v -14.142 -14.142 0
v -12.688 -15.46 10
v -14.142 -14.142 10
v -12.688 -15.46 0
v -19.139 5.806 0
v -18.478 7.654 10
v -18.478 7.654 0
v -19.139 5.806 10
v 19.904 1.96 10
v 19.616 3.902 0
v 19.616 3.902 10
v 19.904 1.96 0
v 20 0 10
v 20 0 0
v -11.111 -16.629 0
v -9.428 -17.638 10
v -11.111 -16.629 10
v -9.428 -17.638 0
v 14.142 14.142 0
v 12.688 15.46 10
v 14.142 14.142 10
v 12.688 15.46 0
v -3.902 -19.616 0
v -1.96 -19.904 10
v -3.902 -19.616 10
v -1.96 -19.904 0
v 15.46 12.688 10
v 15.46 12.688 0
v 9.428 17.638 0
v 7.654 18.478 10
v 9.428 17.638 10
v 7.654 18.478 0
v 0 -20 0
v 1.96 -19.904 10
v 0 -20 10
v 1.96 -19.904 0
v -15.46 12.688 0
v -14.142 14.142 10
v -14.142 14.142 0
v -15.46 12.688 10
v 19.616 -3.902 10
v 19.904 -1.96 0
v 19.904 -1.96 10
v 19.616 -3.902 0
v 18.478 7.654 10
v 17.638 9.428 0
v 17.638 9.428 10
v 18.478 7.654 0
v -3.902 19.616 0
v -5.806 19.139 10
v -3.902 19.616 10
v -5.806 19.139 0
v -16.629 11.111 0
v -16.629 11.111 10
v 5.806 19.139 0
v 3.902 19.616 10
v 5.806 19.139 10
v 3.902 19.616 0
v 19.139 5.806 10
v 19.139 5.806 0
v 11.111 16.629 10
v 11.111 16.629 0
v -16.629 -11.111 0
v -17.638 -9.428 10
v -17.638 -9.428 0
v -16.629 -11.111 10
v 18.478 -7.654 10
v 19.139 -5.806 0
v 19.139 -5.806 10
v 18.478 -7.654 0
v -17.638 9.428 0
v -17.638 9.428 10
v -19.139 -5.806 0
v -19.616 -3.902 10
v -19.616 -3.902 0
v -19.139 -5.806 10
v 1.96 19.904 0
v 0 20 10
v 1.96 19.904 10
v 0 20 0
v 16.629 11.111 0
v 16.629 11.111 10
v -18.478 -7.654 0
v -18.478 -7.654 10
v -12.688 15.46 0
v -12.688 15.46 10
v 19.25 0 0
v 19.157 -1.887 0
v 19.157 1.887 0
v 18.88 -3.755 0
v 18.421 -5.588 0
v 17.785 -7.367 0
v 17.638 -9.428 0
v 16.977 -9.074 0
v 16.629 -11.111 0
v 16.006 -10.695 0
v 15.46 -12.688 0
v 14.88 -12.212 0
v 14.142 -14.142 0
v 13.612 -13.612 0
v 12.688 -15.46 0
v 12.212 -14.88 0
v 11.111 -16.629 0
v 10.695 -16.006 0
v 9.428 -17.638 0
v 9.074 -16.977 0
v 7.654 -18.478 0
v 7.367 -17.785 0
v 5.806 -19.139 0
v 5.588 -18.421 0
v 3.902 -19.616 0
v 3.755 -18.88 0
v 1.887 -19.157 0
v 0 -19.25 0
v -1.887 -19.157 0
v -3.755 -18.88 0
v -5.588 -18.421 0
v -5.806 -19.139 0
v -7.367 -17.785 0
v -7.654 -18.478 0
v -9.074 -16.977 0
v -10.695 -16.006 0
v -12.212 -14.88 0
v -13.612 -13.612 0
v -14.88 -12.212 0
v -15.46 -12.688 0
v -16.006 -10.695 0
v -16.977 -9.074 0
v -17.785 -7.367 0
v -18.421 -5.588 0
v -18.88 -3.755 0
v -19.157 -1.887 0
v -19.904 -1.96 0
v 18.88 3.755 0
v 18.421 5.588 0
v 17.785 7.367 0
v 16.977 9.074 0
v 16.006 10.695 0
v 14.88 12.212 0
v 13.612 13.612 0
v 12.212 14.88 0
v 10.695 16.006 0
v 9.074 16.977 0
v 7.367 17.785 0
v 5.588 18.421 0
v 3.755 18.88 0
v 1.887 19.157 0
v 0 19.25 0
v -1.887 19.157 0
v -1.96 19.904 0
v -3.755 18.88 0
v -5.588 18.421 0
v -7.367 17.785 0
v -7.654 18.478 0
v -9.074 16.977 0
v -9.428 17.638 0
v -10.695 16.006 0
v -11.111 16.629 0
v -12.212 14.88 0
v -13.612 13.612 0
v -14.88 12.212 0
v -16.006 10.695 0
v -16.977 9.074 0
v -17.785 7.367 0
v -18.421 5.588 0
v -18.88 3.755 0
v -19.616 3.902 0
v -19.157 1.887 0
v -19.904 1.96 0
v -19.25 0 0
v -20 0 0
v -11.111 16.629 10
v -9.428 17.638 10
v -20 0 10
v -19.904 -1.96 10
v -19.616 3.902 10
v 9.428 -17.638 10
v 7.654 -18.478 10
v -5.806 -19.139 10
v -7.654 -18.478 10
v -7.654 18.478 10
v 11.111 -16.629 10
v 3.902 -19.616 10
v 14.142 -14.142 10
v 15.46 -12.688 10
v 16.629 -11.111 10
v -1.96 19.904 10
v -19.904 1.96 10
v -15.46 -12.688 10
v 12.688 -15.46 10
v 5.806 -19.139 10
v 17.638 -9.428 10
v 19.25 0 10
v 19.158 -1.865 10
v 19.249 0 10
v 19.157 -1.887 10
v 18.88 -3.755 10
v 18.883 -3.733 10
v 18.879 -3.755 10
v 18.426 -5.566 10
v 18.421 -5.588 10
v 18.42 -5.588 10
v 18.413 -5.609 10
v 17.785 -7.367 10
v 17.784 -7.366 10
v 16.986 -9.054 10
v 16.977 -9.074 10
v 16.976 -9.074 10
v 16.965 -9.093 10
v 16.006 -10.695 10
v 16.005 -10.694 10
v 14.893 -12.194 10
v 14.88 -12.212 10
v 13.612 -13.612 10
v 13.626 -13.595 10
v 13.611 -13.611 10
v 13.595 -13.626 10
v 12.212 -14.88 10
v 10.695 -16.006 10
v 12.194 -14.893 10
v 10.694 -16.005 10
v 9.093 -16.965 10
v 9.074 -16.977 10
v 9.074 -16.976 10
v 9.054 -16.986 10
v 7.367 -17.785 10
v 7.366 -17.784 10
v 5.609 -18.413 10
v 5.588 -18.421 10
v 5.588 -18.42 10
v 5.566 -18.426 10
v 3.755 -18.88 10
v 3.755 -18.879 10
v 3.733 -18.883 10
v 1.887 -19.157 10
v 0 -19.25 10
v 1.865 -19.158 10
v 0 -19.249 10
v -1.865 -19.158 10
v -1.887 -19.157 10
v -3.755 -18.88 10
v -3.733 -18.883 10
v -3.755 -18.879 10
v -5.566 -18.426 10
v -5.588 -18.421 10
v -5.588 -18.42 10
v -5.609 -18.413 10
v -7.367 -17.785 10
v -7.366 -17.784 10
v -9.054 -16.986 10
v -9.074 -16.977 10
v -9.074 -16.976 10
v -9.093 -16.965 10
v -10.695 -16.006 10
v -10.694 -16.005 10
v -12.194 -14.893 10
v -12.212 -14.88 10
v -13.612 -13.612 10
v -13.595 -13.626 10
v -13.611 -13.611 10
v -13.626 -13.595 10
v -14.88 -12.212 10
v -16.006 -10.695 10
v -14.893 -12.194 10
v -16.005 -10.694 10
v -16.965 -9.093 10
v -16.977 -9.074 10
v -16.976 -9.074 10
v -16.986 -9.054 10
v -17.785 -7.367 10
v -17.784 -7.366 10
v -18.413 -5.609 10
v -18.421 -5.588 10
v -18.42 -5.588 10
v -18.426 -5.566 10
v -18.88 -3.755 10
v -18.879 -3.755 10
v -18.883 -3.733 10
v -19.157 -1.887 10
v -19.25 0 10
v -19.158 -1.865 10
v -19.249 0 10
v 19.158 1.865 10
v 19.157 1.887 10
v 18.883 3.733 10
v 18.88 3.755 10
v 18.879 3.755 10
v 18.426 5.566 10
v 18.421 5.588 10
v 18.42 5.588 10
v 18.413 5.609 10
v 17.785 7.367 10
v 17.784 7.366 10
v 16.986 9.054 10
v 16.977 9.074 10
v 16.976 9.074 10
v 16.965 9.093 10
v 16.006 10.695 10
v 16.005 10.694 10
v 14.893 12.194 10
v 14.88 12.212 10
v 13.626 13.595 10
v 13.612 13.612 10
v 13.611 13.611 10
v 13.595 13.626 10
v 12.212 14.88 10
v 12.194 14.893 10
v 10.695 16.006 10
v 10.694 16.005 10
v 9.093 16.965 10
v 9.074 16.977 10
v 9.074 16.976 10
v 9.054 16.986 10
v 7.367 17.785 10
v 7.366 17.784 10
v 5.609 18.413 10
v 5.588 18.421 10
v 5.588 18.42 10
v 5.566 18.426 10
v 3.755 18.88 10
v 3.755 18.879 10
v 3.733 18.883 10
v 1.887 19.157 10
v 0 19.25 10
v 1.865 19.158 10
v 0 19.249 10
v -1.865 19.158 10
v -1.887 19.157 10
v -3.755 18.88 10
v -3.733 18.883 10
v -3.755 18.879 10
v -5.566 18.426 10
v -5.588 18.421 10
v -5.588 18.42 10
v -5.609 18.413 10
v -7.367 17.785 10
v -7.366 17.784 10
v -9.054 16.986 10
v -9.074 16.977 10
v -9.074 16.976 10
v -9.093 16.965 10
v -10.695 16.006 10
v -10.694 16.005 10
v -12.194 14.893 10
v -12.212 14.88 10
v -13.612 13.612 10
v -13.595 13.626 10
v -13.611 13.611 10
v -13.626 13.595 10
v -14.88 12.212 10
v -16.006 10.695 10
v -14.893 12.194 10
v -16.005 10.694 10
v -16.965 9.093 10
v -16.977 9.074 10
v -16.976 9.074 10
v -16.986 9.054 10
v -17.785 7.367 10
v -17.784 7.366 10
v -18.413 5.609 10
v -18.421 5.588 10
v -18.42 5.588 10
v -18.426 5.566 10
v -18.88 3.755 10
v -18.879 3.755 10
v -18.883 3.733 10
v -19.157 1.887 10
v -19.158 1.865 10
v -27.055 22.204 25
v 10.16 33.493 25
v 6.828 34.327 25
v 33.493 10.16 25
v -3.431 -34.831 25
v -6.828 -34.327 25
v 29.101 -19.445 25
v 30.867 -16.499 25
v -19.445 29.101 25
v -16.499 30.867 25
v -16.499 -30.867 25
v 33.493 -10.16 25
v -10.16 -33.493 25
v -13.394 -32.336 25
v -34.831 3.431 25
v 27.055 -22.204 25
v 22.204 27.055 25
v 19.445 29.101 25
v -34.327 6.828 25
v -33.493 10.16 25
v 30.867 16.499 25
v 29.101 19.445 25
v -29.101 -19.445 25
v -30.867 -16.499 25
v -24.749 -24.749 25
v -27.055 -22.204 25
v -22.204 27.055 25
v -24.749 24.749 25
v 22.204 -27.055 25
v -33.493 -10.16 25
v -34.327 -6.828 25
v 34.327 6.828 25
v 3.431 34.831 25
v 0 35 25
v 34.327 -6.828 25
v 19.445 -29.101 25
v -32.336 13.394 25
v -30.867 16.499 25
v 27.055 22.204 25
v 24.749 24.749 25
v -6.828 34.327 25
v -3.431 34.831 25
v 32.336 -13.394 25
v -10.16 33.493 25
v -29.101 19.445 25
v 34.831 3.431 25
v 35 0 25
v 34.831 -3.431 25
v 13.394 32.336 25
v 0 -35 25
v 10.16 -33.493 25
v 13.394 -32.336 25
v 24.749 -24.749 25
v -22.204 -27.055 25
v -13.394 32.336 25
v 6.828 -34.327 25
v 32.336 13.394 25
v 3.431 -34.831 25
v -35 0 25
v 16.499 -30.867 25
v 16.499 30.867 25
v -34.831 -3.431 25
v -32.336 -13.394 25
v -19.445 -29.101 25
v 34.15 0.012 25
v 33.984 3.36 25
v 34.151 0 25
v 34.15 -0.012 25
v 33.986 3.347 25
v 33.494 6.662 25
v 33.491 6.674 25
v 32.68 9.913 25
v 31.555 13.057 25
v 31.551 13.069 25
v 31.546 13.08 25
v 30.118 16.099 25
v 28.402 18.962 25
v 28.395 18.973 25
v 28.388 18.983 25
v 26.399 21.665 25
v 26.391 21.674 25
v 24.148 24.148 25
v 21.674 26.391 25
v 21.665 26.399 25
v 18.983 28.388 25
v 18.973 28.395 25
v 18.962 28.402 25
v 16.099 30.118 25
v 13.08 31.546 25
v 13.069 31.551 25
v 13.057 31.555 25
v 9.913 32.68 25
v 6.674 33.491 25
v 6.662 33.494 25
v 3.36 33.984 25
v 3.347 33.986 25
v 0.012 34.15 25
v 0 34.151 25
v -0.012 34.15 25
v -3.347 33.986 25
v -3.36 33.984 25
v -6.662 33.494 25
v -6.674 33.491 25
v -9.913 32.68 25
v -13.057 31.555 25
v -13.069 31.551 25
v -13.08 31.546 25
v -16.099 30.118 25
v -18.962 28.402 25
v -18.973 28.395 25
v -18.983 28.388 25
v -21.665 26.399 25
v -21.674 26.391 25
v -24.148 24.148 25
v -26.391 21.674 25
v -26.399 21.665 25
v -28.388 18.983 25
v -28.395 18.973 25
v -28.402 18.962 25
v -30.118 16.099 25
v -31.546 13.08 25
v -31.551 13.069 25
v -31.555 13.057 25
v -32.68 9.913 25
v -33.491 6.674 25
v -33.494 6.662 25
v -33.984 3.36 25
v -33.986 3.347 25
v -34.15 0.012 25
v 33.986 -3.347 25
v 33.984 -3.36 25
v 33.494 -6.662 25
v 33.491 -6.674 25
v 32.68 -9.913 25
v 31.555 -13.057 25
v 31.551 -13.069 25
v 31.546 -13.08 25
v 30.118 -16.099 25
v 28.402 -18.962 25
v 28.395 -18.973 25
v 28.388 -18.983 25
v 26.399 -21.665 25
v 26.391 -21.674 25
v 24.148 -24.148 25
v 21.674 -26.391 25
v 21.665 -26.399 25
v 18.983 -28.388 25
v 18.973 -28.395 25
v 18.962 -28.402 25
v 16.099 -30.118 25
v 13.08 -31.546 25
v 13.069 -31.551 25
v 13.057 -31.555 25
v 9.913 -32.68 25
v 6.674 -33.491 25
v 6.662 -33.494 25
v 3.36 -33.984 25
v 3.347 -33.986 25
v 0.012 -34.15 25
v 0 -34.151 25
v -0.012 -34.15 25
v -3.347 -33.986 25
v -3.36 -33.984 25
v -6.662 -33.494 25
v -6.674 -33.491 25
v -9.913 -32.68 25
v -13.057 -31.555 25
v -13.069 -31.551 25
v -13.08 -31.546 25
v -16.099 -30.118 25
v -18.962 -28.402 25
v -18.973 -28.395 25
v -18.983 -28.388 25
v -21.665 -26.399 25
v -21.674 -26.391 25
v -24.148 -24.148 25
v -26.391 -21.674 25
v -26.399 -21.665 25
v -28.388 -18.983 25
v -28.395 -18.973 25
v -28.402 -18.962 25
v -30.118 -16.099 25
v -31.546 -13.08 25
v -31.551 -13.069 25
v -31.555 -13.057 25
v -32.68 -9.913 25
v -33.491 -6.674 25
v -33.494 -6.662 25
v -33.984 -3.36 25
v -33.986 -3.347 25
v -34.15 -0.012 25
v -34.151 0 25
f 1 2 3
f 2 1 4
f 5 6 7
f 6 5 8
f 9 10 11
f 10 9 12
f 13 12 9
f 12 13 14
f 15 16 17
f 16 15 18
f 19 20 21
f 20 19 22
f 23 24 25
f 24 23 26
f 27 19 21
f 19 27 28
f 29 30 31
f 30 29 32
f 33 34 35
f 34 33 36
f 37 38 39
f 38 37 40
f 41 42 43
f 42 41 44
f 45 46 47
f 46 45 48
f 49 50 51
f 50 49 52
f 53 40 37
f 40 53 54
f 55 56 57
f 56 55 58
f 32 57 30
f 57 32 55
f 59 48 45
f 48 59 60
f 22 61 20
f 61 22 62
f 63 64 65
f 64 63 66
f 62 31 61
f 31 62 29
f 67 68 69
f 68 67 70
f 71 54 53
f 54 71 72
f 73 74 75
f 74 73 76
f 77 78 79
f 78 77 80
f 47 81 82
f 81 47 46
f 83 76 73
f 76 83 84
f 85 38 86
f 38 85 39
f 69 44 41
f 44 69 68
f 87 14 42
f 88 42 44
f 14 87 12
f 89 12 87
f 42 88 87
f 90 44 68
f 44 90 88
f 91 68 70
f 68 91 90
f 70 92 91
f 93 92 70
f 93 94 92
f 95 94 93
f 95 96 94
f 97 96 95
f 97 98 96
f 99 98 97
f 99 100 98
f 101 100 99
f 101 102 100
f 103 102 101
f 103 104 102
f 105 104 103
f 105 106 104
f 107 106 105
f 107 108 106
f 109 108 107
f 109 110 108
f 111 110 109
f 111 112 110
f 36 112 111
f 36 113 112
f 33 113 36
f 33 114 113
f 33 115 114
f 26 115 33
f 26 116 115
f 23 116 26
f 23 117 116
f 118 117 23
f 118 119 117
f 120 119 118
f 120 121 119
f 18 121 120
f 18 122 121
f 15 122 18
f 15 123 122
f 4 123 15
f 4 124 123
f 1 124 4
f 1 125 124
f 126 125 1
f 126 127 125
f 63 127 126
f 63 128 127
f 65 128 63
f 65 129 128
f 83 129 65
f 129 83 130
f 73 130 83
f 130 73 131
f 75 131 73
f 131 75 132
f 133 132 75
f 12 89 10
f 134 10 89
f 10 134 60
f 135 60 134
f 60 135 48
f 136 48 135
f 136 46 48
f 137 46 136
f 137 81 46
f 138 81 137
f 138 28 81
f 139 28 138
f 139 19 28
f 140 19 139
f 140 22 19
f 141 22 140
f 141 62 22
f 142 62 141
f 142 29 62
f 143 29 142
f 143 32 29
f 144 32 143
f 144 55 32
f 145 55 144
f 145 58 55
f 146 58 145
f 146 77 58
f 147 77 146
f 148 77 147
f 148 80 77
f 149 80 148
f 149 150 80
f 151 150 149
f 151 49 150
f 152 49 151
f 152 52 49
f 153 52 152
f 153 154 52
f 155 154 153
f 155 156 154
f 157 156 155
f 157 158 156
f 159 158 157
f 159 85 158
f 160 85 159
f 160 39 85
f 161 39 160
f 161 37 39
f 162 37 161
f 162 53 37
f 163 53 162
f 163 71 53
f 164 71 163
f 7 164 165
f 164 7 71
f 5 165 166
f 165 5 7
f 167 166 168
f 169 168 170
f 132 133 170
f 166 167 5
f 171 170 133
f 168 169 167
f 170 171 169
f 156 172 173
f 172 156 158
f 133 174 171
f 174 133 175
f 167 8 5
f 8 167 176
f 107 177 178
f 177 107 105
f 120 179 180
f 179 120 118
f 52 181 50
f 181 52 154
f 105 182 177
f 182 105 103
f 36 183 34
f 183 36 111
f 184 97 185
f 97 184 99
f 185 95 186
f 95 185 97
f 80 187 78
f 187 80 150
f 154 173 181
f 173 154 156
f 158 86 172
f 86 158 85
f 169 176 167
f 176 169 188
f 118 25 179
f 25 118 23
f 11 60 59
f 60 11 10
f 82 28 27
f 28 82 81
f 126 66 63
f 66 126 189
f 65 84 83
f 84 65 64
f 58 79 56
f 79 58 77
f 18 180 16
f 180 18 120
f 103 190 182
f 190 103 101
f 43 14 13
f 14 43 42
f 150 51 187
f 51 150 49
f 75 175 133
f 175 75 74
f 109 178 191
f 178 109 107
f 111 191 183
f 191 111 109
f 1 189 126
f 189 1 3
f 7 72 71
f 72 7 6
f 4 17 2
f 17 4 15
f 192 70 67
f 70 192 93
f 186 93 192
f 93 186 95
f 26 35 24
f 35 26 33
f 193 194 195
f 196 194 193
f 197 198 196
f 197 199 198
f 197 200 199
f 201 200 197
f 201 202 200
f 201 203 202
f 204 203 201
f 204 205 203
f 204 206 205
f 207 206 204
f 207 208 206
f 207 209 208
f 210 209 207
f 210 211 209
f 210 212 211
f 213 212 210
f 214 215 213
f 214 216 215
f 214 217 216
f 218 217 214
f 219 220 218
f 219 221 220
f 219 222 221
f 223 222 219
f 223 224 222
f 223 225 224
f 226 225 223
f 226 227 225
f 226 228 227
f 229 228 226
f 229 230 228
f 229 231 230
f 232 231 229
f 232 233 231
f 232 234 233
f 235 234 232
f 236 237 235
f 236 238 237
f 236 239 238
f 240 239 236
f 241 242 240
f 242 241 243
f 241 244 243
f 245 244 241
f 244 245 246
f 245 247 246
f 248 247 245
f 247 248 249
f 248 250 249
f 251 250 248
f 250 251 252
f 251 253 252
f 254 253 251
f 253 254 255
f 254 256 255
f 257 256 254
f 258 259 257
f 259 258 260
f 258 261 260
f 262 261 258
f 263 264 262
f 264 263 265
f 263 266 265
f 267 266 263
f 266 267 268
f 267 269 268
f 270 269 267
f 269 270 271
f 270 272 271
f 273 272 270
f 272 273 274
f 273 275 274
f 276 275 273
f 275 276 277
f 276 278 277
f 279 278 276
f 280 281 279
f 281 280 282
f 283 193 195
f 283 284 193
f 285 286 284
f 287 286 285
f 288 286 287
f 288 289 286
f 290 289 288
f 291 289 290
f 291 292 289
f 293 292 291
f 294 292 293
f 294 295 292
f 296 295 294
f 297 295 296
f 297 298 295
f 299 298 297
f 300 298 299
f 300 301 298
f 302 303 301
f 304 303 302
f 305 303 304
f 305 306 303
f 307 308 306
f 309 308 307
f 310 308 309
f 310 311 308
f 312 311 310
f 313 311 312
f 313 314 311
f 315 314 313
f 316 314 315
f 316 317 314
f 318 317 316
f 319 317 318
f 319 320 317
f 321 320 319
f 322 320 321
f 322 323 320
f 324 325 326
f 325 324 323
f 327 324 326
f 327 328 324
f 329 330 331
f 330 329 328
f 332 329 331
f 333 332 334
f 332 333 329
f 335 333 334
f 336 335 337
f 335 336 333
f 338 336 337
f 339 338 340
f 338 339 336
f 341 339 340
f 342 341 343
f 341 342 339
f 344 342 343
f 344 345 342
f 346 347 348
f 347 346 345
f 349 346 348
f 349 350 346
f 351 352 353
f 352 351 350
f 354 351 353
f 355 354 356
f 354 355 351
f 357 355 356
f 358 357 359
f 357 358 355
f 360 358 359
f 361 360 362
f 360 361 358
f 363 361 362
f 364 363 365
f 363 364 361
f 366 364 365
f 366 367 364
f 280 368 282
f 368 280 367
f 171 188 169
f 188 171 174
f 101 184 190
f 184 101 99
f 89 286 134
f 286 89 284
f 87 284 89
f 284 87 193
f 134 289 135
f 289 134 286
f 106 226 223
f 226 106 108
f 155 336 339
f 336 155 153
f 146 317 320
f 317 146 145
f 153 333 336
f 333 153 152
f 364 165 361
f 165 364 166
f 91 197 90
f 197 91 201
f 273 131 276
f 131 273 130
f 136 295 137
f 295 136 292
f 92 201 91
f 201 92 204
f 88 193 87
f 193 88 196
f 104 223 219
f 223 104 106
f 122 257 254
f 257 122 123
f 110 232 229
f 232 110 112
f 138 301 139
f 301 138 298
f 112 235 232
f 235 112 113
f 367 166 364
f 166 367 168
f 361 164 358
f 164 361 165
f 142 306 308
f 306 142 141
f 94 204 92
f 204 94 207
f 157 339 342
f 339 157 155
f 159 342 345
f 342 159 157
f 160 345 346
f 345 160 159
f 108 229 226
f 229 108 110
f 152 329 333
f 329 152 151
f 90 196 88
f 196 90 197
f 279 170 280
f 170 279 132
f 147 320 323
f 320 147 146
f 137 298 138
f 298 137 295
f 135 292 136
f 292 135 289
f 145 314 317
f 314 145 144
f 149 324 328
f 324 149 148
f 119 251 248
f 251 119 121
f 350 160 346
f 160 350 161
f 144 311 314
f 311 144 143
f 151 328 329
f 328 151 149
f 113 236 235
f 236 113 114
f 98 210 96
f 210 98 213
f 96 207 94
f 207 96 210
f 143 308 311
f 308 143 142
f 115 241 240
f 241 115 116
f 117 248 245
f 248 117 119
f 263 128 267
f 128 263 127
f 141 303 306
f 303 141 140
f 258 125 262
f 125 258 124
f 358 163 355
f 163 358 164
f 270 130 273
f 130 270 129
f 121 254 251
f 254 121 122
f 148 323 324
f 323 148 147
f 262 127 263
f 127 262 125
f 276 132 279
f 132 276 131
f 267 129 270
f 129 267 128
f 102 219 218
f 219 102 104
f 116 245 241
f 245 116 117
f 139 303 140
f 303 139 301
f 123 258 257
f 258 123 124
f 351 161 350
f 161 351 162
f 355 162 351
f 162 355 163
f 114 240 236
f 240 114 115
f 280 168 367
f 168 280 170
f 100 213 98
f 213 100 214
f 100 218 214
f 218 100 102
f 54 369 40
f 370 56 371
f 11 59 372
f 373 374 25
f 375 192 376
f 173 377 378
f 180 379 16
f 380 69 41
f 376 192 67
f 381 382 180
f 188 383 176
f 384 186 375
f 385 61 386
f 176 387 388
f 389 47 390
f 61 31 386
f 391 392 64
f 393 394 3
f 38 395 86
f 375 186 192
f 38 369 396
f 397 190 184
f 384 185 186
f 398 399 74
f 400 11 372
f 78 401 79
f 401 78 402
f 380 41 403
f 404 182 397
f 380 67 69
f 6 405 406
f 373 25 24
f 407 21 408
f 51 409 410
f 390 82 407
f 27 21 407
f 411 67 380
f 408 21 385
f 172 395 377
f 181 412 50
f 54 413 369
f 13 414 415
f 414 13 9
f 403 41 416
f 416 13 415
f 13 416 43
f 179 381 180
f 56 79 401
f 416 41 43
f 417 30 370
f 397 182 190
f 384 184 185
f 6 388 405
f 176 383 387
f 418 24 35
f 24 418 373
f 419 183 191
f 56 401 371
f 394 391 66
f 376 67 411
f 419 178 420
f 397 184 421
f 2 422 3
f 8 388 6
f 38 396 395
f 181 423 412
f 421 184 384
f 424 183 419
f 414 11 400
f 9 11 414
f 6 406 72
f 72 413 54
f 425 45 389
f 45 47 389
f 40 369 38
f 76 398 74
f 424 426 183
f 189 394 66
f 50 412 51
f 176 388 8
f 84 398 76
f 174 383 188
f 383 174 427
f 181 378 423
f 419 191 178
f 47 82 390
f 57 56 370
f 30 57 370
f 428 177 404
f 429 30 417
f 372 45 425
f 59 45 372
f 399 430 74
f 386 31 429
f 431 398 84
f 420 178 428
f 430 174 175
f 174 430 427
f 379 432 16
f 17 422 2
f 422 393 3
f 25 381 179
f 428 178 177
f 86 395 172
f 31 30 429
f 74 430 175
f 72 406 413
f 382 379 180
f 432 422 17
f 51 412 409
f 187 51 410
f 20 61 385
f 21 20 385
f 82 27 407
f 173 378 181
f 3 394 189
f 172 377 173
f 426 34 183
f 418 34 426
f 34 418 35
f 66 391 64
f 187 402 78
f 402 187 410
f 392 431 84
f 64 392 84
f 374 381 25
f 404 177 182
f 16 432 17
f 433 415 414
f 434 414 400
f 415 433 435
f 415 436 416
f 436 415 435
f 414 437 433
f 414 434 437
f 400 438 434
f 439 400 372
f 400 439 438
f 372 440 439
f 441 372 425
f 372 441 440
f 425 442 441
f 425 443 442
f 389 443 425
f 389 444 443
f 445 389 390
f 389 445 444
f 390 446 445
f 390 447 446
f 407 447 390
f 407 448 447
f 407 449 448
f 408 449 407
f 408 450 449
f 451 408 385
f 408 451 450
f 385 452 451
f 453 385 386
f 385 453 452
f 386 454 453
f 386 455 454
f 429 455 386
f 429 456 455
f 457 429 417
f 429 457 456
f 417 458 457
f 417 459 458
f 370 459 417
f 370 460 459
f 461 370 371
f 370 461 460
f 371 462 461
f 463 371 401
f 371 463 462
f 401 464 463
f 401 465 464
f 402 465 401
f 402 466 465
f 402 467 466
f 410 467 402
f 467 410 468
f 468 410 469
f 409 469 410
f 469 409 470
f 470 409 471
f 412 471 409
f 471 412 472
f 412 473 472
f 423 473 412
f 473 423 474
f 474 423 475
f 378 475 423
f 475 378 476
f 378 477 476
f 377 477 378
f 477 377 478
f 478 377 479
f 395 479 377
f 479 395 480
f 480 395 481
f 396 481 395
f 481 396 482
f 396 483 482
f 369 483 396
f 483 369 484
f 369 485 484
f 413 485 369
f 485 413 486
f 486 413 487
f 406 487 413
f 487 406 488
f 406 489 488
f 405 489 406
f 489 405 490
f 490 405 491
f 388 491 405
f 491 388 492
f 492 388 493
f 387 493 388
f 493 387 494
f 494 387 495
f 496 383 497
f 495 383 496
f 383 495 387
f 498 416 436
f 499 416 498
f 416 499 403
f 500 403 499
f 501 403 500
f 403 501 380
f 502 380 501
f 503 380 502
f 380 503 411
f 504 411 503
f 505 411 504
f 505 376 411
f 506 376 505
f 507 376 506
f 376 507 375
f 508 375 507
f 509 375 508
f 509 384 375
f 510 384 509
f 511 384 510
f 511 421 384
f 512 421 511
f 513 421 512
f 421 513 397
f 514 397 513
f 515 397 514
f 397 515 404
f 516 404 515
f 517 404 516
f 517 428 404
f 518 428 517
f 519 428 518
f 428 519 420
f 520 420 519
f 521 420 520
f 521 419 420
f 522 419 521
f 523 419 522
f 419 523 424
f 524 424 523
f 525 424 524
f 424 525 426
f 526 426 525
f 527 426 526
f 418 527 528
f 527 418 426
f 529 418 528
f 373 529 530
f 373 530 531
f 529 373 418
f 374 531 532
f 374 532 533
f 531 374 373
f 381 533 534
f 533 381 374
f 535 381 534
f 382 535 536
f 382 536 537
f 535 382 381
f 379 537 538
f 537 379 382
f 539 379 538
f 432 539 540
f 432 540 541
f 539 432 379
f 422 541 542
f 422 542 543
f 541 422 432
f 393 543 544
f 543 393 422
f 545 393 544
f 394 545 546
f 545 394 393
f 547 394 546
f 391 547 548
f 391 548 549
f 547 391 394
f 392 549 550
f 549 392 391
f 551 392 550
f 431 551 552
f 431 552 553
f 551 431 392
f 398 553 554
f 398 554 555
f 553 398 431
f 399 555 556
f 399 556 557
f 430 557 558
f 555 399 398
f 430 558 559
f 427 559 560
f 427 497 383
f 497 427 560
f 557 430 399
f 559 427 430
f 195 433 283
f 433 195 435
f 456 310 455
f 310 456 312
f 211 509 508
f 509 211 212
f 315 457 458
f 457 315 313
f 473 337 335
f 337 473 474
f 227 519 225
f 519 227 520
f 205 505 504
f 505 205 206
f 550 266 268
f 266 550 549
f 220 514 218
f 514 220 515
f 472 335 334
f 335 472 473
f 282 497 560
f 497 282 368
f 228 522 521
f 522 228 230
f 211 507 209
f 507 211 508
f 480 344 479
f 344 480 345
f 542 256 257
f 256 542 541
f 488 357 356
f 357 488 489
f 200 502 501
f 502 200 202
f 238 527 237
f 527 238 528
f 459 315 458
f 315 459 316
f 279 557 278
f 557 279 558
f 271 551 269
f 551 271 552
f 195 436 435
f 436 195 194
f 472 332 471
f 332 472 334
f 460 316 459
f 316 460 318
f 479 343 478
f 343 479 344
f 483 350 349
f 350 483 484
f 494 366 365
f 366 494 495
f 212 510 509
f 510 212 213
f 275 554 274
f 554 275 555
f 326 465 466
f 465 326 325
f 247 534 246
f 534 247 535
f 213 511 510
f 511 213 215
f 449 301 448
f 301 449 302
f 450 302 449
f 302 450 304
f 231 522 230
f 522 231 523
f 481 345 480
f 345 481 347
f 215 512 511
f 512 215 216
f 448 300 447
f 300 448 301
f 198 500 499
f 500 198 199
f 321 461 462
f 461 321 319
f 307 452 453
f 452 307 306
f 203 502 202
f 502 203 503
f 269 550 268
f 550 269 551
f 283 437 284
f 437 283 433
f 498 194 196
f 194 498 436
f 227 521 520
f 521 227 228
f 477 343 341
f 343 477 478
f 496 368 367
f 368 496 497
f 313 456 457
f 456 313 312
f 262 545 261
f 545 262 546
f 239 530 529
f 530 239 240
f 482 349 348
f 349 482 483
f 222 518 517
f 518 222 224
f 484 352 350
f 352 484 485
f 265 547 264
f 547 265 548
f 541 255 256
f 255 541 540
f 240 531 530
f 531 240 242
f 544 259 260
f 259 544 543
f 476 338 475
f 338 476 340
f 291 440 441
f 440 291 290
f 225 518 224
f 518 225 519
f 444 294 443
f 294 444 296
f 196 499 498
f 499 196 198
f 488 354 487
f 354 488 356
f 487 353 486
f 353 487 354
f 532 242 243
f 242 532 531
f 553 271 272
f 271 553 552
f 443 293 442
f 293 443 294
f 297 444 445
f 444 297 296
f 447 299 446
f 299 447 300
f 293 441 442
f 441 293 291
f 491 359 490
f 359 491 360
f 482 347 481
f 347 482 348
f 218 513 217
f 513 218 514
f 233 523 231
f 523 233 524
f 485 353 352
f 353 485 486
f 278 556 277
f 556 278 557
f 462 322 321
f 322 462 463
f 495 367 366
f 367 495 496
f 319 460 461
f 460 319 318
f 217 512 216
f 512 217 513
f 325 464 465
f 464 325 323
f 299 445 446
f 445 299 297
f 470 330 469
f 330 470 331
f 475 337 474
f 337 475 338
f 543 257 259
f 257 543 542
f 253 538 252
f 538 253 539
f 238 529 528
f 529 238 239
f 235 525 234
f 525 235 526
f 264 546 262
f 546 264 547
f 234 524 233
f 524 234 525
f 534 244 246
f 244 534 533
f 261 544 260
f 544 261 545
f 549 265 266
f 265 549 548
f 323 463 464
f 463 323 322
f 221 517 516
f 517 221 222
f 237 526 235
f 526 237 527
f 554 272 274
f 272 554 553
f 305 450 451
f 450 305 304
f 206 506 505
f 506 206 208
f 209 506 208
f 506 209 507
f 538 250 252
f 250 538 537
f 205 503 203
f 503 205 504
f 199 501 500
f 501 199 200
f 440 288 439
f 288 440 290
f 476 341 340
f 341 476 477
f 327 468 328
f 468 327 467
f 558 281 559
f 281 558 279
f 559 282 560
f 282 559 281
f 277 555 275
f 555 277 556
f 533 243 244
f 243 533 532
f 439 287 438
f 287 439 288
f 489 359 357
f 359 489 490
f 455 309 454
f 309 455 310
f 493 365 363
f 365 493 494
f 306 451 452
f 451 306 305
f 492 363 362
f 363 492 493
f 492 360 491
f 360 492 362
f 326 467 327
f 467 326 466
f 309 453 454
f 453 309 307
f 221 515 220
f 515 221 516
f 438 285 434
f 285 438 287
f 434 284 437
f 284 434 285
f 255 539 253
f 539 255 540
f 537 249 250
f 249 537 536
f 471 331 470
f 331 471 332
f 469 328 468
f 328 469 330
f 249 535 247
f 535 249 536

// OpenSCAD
// Inner diameter
innerDiameter = 40; // [30:50]

// Diameteter of funnel
funnelDiameter = 70; // [50:80]

// Material thickness
materialThickness = 3; // [1:10]

// Funnel tunnel height
funnelTunnelHeight = 10; // [5:15]

// Height of funnel
funnelHeight = 15; // [10:20]

// Rounding of edges
$fn = $preview ? 16 : 64;

// Base
difference() {
  cylinder(d=innerDiameter, h=funnelTunnelHeight);
  translate([0,0,-1]) cylinder(d=innerDiameter-materialThickness/2, h=funnelTunnelHeight+2);
}

difference() {
  translate([0,0,funnelTunnelHeight]) cylinder(d1=innerDiameter, d2=funnelDiameter, h=funnelHeight);
  translate([0,0,funnelTunnelHeight-0.1]) cylinder(d1=innerDiameter-materialThickness/2-0.2, d2=funnelDiameter-materialThickness/2, h=funnelHeight+0.2);
}
